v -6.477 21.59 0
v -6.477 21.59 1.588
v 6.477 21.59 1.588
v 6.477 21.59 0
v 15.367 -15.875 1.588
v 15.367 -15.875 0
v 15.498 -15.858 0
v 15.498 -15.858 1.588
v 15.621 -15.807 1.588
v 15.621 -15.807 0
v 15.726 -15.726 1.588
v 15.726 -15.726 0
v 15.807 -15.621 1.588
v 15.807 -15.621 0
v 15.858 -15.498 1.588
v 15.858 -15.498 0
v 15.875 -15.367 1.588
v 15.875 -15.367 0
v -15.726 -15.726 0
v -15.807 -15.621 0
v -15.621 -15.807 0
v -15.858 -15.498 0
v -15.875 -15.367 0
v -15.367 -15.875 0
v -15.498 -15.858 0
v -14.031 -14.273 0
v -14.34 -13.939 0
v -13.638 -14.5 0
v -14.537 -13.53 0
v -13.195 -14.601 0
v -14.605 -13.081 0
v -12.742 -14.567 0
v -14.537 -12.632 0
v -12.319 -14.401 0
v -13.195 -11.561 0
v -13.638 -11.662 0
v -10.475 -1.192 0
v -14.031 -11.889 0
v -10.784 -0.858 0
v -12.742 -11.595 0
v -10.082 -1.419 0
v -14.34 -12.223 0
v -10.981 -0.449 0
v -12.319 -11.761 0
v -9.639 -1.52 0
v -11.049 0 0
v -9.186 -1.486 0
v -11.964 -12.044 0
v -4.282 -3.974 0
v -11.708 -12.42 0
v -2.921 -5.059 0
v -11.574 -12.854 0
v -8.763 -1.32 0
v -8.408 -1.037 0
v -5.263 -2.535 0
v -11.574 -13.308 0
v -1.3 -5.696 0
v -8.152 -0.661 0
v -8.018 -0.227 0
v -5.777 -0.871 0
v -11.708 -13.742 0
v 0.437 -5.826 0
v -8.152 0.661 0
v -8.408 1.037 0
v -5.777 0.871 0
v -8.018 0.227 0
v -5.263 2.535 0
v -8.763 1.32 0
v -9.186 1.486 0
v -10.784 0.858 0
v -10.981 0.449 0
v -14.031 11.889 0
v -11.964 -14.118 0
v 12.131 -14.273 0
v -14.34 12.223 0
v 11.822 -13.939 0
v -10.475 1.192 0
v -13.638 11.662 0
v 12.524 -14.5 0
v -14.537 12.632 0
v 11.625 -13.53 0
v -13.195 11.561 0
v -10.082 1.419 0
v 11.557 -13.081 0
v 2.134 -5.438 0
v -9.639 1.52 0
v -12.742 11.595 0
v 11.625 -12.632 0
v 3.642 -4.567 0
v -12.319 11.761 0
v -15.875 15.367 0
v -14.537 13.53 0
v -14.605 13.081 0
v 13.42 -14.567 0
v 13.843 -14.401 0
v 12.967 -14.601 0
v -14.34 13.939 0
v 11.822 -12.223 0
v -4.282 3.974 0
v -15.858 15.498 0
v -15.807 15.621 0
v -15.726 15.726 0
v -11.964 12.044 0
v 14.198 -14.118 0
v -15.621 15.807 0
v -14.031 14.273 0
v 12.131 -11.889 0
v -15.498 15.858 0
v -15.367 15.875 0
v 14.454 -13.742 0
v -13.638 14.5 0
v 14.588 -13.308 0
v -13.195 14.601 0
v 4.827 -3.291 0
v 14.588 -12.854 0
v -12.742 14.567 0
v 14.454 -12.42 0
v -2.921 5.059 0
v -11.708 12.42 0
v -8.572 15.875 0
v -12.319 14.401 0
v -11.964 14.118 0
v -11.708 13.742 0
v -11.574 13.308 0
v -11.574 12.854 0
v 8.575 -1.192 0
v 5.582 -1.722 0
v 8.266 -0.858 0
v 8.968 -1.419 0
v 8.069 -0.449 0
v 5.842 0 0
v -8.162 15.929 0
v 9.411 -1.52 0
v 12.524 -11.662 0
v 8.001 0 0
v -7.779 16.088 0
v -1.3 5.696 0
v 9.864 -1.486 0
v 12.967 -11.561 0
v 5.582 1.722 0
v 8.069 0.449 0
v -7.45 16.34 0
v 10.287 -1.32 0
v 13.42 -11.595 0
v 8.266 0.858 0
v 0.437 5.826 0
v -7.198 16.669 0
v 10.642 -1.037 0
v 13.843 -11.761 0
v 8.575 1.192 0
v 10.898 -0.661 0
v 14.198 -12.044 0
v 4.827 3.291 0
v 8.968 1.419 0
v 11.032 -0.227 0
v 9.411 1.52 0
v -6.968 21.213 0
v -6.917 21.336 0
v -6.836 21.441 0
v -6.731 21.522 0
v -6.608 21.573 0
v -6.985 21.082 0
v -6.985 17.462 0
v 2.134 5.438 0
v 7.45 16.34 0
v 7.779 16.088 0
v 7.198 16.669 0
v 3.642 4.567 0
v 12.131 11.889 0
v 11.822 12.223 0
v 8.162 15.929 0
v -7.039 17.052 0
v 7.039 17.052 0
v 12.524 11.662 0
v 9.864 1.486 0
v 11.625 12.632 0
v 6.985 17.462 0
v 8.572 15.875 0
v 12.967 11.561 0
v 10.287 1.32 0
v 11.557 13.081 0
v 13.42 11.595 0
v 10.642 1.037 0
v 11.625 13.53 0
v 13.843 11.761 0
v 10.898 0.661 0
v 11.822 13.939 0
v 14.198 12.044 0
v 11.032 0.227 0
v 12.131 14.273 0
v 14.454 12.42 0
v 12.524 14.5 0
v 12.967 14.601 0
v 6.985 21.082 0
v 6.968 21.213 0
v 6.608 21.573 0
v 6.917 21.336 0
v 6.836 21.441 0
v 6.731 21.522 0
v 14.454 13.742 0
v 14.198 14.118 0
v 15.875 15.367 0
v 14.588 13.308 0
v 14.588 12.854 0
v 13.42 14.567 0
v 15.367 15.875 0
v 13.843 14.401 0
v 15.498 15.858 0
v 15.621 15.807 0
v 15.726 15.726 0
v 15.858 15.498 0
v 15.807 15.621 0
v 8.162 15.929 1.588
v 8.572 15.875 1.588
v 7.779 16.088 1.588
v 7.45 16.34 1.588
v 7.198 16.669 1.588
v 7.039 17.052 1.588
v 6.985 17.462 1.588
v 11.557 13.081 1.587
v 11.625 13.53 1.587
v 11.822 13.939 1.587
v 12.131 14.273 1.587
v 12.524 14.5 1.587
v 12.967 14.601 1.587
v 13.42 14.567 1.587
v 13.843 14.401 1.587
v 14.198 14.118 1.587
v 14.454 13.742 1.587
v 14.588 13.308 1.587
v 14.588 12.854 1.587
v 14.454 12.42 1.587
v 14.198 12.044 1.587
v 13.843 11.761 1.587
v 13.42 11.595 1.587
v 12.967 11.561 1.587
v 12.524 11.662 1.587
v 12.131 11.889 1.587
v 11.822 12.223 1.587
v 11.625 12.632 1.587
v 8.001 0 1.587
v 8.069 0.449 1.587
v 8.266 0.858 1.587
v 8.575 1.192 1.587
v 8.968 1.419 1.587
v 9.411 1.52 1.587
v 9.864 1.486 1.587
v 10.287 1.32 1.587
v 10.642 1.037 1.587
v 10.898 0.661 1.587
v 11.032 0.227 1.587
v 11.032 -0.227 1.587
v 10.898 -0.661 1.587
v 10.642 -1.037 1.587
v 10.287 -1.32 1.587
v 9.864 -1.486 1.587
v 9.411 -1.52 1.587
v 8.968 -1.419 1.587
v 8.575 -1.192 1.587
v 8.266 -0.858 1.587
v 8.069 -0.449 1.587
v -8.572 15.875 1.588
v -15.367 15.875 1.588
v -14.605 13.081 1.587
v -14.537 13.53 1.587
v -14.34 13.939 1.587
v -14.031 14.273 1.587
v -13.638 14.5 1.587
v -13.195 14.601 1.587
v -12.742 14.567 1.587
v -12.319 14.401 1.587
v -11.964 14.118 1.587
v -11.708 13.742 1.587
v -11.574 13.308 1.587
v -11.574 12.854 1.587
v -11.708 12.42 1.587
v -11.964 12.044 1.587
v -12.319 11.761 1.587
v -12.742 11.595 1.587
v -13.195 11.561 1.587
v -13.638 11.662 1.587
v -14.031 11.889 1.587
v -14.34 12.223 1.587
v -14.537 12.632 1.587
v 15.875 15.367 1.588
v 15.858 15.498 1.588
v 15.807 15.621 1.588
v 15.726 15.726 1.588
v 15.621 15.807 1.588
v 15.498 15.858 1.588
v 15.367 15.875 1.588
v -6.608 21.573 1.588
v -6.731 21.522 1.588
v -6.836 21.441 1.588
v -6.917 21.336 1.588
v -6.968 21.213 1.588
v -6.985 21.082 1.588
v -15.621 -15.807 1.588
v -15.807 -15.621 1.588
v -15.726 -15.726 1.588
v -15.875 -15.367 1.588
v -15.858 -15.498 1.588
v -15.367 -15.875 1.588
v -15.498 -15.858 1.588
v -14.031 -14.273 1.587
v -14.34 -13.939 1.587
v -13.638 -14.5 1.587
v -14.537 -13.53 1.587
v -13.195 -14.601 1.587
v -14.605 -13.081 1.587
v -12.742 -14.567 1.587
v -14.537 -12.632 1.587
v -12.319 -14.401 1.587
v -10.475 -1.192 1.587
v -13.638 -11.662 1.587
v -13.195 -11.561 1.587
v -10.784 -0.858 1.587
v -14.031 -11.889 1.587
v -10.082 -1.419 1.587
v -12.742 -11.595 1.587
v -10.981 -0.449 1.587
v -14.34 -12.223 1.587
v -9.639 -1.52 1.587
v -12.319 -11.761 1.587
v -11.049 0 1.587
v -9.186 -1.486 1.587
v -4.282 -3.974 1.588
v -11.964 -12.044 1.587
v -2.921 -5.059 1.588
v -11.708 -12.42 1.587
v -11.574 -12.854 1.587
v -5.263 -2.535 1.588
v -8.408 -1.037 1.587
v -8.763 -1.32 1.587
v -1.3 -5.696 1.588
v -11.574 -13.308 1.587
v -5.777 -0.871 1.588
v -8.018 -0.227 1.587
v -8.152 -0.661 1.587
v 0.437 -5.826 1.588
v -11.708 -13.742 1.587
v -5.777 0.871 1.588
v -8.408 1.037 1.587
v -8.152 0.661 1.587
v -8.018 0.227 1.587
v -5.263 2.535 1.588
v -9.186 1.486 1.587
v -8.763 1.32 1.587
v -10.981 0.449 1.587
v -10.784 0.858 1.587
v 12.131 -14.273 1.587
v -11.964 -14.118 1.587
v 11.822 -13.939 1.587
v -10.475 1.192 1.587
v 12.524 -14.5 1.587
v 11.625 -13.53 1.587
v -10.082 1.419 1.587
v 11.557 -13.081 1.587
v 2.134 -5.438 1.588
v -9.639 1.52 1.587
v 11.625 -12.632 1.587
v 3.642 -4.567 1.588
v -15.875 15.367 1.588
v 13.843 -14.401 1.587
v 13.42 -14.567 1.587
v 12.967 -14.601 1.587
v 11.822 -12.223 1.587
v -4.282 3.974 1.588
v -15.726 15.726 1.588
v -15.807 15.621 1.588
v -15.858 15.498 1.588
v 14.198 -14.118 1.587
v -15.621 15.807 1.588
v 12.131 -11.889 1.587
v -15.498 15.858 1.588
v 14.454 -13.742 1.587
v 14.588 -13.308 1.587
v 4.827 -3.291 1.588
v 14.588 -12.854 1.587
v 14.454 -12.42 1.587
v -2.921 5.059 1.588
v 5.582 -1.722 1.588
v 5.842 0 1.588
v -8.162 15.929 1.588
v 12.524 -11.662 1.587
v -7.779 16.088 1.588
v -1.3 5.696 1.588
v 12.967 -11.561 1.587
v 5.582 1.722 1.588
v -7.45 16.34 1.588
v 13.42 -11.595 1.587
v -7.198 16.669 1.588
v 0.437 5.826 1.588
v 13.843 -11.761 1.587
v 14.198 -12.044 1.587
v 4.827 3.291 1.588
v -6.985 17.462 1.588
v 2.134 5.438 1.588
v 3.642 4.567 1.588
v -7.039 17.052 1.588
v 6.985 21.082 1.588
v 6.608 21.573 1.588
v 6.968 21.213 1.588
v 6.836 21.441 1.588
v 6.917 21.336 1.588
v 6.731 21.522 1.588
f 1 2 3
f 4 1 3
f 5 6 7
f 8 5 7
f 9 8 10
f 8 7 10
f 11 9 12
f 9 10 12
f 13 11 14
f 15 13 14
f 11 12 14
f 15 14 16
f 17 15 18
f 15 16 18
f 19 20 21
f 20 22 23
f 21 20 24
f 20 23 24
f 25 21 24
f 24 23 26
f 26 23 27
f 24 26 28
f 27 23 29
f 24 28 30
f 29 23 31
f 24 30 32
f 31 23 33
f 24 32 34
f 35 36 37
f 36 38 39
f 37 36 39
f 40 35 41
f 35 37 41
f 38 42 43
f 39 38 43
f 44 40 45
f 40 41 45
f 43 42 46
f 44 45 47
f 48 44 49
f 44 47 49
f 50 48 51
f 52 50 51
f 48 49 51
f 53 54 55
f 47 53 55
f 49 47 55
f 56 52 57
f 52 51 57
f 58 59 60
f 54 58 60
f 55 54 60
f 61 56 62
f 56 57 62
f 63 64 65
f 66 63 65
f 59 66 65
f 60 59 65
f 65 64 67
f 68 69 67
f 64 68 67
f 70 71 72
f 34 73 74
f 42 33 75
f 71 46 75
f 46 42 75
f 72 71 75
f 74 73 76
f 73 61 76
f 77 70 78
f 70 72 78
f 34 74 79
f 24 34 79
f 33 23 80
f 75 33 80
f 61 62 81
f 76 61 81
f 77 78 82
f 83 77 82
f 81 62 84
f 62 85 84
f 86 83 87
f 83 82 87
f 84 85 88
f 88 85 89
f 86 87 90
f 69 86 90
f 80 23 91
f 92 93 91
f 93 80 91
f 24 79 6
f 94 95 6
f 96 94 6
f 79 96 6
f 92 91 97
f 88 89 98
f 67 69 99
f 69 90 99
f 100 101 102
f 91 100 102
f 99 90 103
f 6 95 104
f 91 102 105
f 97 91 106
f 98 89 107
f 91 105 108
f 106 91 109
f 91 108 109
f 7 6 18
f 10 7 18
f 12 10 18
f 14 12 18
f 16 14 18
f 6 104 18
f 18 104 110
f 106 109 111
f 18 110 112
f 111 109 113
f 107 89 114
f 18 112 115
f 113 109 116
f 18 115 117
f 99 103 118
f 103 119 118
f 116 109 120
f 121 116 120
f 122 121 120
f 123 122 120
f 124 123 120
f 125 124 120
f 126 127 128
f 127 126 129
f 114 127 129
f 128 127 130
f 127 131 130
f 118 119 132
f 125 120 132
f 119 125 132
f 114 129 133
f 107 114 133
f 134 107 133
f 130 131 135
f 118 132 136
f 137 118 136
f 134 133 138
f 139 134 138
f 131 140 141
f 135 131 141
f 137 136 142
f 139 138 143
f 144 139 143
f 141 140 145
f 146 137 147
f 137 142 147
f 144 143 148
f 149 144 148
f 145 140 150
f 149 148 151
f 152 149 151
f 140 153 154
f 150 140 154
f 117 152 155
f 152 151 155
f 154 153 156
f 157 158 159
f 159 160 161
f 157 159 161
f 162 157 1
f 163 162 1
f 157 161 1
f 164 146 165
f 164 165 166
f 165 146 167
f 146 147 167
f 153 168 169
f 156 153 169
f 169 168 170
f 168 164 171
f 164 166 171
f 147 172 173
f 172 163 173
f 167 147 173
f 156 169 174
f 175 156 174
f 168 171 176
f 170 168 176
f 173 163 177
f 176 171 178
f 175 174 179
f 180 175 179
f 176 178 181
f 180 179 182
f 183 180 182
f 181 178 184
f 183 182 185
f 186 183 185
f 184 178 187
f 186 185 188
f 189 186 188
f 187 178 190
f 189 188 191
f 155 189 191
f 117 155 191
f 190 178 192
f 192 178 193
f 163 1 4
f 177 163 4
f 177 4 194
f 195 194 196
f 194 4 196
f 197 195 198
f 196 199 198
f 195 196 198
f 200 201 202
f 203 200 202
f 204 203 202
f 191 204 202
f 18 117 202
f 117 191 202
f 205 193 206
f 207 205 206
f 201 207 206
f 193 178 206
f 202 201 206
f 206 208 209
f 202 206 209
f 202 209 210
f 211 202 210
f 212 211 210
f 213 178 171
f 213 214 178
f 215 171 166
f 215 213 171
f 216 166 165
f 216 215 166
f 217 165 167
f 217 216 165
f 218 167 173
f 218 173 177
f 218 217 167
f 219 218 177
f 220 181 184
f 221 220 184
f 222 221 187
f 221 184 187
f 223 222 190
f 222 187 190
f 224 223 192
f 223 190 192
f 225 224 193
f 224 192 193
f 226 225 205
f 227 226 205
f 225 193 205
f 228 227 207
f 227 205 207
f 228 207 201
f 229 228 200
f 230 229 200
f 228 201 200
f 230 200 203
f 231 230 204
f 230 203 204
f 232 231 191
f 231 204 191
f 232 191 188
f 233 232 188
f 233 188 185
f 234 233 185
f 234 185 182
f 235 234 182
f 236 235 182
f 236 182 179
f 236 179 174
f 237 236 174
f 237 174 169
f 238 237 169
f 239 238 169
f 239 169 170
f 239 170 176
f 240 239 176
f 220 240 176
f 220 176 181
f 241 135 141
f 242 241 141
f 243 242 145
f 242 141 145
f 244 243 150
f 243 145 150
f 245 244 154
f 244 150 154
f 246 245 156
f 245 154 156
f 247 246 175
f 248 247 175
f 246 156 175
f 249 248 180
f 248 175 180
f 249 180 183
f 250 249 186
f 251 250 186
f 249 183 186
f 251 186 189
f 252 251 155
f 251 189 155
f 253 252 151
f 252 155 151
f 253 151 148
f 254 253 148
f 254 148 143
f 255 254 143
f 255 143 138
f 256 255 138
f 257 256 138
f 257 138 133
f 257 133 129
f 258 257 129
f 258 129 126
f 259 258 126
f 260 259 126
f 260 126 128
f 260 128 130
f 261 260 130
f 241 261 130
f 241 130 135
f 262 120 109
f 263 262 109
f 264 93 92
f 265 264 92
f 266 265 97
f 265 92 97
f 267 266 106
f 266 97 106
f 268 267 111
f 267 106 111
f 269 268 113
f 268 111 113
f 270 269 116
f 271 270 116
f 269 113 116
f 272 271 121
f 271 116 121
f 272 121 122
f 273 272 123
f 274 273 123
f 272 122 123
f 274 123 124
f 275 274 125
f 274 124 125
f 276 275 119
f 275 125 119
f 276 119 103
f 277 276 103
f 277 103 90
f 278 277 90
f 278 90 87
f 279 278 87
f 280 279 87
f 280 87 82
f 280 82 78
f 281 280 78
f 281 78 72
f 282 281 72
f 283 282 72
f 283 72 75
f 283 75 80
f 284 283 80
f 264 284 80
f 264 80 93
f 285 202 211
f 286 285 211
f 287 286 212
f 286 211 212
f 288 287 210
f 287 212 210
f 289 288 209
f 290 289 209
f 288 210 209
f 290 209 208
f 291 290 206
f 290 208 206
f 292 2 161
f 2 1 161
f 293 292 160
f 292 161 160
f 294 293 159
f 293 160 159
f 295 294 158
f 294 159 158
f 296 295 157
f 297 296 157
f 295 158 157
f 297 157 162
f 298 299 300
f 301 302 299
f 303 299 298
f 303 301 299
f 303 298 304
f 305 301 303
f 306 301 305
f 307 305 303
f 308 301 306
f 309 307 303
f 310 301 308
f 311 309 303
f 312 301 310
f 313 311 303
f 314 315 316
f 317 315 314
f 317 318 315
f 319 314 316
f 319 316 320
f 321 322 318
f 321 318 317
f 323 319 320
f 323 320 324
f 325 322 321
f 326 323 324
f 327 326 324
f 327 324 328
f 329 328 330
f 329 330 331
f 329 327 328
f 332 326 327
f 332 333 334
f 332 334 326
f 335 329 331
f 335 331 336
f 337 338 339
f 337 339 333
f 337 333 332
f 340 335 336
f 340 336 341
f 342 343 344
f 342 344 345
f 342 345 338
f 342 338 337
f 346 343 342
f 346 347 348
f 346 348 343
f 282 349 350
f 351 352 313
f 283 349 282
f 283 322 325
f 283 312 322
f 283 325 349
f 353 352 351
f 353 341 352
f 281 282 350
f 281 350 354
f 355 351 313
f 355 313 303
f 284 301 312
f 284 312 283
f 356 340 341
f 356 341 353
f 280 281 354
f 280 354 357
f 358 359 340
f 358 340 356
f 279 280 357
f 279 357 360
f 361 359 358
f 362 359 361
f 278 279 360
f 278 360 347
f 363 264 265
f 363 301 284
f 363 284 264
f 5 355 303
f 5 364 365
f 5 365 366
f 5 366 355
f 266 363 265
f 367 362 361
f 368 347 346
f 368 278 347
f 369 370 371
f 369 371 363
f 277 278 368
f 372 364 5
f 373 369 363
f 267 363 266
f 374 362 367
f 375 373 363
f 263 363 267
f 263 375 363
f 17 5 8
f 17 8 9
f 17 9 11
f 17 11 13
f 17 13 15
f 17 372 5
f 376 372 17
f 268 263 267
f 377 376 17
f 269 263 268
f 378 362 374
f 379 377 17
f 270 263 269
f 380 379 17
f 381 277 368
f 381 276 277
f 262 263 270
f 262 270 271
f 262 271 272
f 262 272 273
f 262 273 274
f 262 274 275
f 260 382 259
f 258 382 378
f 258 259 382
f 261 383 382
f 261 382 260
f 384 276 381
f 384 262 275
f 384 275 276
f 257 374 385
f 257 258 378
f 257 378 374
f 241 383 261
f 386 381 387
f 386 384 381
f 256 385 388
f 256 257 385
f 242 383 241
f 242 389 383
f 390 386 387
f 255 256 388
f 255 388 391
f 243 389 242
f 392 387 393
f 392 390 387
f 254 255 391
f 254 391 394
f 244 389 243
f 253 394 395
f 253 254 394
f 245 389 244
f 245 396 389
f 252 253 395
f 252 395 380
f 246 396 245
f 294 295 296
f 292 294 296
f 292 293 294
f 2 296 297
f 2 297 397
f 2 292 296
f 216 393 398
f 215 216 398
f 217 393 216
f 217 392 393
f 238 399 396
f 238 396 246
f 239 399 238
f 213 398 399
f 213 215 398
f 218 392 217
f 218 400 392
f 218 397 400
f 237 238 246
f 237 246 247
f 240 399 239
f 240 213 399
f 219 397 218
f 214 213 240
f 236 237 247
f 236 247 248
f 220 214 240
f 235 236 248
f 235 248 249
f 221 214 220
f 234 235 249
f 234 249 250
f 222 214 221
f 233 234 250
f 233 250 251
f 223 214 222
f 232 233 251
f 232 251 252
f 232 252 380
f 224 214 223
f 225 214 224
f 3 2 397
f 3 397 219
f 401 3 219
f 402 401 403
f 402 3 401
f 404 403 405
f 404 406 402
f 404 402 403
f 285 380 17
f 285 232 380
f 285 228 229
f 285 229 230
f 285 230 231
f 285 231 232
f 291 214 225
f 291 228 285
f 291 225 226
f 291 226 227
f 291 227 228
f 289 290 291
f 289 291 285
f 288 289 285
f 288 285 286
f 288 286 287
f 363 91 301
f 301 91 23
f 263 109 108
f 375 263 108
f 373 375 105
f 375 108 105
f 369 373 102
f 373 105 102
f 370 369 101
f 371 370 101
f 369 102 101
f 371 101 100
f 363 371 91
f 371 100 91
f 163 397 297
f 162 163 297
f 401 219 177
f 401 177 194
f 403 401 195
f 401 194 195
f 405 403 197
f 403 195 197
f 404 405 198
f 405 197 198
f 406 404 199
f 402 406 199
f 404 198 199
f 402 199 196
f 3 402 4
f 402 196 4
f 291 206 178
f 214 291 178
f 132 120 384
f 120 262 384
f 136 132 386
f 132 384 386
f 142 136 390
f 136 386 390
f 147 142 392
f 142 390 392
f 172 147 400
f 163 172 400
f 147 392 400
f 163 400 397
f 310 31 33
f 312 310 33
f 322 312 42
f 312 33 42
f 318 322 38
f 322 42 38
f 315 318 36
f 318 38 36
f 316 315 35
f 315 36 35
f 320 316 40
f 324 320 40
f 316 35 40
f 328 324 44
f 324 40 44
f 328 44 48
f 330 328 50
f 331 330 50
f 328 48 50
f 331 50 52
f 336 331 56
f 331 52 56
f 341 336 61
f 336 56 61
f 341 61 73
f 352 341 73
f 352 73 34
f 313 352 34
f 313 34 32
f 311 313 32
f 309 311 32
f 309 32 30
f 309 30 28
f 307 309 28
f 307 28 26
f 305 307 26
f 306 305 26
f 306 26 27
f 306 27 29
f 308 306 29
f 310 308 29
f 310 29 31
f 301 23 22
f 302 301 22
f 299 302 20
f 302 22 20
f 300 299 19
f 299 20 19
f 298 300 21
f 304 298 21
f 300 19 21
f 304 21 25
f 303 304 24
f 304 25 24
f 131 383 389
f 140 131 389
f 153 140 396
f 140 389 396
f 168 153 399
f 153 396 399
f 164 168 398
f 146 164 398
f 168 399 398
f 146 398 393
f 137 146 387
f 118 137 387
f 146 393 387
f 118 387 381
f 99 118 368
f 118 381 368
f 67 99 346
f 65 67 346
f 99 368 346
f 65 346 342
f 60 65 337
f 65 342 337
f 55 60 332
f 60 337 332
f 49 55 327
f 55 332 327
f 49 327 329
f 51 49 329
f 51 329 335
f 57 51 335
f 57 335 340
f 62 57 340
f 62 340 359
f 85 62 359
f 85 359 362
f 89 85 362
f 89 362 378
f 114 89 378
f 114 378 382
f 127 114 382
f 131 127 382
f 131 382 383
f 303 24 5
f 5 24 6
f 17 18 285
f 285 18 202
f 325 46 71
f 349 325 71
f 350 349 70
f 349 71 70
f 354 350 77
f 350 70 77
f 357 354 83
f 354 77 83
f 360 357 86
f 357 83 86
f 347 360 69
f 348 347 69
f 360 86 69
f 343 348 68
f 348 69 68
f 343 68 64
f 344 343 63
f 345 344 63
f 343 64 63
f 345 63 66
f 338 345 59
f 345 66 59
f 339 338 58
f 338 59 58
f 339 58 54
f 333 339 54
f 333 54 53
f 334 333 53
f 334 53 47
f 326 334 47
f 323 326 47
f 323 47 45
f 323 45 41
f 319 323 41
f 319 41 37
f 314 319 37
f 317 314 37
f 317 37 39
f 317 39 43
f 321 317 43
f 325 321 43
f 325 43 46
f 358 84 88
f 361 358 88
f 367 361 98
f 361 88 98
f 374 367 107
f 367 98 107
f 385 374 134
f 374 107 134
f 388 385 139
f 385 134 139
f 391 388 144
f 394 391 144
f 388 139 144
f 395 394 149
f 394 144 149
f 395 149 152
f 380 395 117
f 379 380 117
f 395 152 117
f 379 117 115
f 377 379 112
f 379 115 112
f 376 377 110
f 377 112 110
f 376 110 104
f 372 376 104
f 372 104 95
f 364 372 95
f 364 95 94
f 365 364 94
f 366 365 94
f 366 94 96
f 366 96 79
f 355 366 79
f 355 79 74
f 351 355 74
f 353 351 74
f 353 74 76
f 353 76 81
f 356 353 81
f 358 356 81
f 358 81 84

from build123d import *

# Parameters (mm, degrees)
BOSS_EXTRUDE1_DEPTH   = 1.5875
SKETCH2_R             = 5.842
CUT_EXTRUDE1_DEPTH    = 23.50669692
F_4_CLEARANCE_HOLE1_D = 3.048
SKETCH5_W             = 13.97
SKETCH5_H             = 11.43
BOSS_EXTRUDE2_DEPTH   = 1.5875
FILLET1_R             = 1.5875
FILLET2_R             = 0.508


with BuildPart() as part:
    # Sketch1 → Boss-Extrude1 (new body)
    with BuildSketch(Plane.XY):
        with BuildLine():
            Line((15.367, 15.875), (-15.367, 15.875))
            ThreePointArc((-15.367, 15.875), (-15.726210245, 15.726210245), (-15.875, 15.367))
            Line((-15.875, 15.367), (-15.875, -15.367))
            ThreePointArc((-15.875, -15.367), (-15.726210245, -15.726210245), (-15.367, -15.875))
            Line((-15.367, -15.875), (15.367, -15.875))
            ThreePointArc((15.367, -15.875), (15.726210245, -15.726210245), (15.875, -15.367))
            Line((15.875, -15.367), (15.875, 15.367))
            ThreePointArc((15.875, 15.367), (15.726210245, 15.726210245), (15.367, 15.875))
        make_face()
    extrude(amount=BOSS_EXTRUDE1_DEPTH)

    # Sketch2 → Cut-Extrude1 (cut, through all)
    with BuildSketch(Plane.XY.offset(1.5875)):
        Circle(SKETCH2_R)
    extrude(amount=-CUT_EXTRUDE1_DEPTH, mode=Mode.SUBTRACT)

    # #4 Clearance Hole1 (through all)
    with Locations(Plane.XY.offset(1.5875)):
        with Locations((-13.081, 13.081), (13.081, 13.081), (13.081, -13.081), (-13.081, -13.081), (-9.525, 0), (9.525, 0)):
            Hole(F_4_CLEARANCE_HOLE1_D / 2)

    # Sketch5 → Boss-Extrude2 (add, through all)
    with BuildSketch(Plane.XY.offset(1.5875)):
        with Locations((0, 15.875)):
            Rectangle(SKETCH5_W, SKETCH5_H)
    extrude(amount=-BOSS_EXTRUDE2_DEPTH)

    # Fillet1
    fillet1_edges = [part.edges().sort_by_distance(p)[0] for p in [
        (-6.985, 15.875, 0.79375),
        (6.985, 15.875, 0.79375),
    ]]
    fillet(fillet1_edges, radius=FILLET1_R)

    # Fillet2
    fillet2_edges = [part.edges().sort_by_distance(p)[0] for p in [
        (6.985, 21.59, 0.79375),
        (-6.985, 21.59, 0.79375),
    ]]
    fillet(fillet2_edges, radius=FILLET2_R)


solid = part.part
